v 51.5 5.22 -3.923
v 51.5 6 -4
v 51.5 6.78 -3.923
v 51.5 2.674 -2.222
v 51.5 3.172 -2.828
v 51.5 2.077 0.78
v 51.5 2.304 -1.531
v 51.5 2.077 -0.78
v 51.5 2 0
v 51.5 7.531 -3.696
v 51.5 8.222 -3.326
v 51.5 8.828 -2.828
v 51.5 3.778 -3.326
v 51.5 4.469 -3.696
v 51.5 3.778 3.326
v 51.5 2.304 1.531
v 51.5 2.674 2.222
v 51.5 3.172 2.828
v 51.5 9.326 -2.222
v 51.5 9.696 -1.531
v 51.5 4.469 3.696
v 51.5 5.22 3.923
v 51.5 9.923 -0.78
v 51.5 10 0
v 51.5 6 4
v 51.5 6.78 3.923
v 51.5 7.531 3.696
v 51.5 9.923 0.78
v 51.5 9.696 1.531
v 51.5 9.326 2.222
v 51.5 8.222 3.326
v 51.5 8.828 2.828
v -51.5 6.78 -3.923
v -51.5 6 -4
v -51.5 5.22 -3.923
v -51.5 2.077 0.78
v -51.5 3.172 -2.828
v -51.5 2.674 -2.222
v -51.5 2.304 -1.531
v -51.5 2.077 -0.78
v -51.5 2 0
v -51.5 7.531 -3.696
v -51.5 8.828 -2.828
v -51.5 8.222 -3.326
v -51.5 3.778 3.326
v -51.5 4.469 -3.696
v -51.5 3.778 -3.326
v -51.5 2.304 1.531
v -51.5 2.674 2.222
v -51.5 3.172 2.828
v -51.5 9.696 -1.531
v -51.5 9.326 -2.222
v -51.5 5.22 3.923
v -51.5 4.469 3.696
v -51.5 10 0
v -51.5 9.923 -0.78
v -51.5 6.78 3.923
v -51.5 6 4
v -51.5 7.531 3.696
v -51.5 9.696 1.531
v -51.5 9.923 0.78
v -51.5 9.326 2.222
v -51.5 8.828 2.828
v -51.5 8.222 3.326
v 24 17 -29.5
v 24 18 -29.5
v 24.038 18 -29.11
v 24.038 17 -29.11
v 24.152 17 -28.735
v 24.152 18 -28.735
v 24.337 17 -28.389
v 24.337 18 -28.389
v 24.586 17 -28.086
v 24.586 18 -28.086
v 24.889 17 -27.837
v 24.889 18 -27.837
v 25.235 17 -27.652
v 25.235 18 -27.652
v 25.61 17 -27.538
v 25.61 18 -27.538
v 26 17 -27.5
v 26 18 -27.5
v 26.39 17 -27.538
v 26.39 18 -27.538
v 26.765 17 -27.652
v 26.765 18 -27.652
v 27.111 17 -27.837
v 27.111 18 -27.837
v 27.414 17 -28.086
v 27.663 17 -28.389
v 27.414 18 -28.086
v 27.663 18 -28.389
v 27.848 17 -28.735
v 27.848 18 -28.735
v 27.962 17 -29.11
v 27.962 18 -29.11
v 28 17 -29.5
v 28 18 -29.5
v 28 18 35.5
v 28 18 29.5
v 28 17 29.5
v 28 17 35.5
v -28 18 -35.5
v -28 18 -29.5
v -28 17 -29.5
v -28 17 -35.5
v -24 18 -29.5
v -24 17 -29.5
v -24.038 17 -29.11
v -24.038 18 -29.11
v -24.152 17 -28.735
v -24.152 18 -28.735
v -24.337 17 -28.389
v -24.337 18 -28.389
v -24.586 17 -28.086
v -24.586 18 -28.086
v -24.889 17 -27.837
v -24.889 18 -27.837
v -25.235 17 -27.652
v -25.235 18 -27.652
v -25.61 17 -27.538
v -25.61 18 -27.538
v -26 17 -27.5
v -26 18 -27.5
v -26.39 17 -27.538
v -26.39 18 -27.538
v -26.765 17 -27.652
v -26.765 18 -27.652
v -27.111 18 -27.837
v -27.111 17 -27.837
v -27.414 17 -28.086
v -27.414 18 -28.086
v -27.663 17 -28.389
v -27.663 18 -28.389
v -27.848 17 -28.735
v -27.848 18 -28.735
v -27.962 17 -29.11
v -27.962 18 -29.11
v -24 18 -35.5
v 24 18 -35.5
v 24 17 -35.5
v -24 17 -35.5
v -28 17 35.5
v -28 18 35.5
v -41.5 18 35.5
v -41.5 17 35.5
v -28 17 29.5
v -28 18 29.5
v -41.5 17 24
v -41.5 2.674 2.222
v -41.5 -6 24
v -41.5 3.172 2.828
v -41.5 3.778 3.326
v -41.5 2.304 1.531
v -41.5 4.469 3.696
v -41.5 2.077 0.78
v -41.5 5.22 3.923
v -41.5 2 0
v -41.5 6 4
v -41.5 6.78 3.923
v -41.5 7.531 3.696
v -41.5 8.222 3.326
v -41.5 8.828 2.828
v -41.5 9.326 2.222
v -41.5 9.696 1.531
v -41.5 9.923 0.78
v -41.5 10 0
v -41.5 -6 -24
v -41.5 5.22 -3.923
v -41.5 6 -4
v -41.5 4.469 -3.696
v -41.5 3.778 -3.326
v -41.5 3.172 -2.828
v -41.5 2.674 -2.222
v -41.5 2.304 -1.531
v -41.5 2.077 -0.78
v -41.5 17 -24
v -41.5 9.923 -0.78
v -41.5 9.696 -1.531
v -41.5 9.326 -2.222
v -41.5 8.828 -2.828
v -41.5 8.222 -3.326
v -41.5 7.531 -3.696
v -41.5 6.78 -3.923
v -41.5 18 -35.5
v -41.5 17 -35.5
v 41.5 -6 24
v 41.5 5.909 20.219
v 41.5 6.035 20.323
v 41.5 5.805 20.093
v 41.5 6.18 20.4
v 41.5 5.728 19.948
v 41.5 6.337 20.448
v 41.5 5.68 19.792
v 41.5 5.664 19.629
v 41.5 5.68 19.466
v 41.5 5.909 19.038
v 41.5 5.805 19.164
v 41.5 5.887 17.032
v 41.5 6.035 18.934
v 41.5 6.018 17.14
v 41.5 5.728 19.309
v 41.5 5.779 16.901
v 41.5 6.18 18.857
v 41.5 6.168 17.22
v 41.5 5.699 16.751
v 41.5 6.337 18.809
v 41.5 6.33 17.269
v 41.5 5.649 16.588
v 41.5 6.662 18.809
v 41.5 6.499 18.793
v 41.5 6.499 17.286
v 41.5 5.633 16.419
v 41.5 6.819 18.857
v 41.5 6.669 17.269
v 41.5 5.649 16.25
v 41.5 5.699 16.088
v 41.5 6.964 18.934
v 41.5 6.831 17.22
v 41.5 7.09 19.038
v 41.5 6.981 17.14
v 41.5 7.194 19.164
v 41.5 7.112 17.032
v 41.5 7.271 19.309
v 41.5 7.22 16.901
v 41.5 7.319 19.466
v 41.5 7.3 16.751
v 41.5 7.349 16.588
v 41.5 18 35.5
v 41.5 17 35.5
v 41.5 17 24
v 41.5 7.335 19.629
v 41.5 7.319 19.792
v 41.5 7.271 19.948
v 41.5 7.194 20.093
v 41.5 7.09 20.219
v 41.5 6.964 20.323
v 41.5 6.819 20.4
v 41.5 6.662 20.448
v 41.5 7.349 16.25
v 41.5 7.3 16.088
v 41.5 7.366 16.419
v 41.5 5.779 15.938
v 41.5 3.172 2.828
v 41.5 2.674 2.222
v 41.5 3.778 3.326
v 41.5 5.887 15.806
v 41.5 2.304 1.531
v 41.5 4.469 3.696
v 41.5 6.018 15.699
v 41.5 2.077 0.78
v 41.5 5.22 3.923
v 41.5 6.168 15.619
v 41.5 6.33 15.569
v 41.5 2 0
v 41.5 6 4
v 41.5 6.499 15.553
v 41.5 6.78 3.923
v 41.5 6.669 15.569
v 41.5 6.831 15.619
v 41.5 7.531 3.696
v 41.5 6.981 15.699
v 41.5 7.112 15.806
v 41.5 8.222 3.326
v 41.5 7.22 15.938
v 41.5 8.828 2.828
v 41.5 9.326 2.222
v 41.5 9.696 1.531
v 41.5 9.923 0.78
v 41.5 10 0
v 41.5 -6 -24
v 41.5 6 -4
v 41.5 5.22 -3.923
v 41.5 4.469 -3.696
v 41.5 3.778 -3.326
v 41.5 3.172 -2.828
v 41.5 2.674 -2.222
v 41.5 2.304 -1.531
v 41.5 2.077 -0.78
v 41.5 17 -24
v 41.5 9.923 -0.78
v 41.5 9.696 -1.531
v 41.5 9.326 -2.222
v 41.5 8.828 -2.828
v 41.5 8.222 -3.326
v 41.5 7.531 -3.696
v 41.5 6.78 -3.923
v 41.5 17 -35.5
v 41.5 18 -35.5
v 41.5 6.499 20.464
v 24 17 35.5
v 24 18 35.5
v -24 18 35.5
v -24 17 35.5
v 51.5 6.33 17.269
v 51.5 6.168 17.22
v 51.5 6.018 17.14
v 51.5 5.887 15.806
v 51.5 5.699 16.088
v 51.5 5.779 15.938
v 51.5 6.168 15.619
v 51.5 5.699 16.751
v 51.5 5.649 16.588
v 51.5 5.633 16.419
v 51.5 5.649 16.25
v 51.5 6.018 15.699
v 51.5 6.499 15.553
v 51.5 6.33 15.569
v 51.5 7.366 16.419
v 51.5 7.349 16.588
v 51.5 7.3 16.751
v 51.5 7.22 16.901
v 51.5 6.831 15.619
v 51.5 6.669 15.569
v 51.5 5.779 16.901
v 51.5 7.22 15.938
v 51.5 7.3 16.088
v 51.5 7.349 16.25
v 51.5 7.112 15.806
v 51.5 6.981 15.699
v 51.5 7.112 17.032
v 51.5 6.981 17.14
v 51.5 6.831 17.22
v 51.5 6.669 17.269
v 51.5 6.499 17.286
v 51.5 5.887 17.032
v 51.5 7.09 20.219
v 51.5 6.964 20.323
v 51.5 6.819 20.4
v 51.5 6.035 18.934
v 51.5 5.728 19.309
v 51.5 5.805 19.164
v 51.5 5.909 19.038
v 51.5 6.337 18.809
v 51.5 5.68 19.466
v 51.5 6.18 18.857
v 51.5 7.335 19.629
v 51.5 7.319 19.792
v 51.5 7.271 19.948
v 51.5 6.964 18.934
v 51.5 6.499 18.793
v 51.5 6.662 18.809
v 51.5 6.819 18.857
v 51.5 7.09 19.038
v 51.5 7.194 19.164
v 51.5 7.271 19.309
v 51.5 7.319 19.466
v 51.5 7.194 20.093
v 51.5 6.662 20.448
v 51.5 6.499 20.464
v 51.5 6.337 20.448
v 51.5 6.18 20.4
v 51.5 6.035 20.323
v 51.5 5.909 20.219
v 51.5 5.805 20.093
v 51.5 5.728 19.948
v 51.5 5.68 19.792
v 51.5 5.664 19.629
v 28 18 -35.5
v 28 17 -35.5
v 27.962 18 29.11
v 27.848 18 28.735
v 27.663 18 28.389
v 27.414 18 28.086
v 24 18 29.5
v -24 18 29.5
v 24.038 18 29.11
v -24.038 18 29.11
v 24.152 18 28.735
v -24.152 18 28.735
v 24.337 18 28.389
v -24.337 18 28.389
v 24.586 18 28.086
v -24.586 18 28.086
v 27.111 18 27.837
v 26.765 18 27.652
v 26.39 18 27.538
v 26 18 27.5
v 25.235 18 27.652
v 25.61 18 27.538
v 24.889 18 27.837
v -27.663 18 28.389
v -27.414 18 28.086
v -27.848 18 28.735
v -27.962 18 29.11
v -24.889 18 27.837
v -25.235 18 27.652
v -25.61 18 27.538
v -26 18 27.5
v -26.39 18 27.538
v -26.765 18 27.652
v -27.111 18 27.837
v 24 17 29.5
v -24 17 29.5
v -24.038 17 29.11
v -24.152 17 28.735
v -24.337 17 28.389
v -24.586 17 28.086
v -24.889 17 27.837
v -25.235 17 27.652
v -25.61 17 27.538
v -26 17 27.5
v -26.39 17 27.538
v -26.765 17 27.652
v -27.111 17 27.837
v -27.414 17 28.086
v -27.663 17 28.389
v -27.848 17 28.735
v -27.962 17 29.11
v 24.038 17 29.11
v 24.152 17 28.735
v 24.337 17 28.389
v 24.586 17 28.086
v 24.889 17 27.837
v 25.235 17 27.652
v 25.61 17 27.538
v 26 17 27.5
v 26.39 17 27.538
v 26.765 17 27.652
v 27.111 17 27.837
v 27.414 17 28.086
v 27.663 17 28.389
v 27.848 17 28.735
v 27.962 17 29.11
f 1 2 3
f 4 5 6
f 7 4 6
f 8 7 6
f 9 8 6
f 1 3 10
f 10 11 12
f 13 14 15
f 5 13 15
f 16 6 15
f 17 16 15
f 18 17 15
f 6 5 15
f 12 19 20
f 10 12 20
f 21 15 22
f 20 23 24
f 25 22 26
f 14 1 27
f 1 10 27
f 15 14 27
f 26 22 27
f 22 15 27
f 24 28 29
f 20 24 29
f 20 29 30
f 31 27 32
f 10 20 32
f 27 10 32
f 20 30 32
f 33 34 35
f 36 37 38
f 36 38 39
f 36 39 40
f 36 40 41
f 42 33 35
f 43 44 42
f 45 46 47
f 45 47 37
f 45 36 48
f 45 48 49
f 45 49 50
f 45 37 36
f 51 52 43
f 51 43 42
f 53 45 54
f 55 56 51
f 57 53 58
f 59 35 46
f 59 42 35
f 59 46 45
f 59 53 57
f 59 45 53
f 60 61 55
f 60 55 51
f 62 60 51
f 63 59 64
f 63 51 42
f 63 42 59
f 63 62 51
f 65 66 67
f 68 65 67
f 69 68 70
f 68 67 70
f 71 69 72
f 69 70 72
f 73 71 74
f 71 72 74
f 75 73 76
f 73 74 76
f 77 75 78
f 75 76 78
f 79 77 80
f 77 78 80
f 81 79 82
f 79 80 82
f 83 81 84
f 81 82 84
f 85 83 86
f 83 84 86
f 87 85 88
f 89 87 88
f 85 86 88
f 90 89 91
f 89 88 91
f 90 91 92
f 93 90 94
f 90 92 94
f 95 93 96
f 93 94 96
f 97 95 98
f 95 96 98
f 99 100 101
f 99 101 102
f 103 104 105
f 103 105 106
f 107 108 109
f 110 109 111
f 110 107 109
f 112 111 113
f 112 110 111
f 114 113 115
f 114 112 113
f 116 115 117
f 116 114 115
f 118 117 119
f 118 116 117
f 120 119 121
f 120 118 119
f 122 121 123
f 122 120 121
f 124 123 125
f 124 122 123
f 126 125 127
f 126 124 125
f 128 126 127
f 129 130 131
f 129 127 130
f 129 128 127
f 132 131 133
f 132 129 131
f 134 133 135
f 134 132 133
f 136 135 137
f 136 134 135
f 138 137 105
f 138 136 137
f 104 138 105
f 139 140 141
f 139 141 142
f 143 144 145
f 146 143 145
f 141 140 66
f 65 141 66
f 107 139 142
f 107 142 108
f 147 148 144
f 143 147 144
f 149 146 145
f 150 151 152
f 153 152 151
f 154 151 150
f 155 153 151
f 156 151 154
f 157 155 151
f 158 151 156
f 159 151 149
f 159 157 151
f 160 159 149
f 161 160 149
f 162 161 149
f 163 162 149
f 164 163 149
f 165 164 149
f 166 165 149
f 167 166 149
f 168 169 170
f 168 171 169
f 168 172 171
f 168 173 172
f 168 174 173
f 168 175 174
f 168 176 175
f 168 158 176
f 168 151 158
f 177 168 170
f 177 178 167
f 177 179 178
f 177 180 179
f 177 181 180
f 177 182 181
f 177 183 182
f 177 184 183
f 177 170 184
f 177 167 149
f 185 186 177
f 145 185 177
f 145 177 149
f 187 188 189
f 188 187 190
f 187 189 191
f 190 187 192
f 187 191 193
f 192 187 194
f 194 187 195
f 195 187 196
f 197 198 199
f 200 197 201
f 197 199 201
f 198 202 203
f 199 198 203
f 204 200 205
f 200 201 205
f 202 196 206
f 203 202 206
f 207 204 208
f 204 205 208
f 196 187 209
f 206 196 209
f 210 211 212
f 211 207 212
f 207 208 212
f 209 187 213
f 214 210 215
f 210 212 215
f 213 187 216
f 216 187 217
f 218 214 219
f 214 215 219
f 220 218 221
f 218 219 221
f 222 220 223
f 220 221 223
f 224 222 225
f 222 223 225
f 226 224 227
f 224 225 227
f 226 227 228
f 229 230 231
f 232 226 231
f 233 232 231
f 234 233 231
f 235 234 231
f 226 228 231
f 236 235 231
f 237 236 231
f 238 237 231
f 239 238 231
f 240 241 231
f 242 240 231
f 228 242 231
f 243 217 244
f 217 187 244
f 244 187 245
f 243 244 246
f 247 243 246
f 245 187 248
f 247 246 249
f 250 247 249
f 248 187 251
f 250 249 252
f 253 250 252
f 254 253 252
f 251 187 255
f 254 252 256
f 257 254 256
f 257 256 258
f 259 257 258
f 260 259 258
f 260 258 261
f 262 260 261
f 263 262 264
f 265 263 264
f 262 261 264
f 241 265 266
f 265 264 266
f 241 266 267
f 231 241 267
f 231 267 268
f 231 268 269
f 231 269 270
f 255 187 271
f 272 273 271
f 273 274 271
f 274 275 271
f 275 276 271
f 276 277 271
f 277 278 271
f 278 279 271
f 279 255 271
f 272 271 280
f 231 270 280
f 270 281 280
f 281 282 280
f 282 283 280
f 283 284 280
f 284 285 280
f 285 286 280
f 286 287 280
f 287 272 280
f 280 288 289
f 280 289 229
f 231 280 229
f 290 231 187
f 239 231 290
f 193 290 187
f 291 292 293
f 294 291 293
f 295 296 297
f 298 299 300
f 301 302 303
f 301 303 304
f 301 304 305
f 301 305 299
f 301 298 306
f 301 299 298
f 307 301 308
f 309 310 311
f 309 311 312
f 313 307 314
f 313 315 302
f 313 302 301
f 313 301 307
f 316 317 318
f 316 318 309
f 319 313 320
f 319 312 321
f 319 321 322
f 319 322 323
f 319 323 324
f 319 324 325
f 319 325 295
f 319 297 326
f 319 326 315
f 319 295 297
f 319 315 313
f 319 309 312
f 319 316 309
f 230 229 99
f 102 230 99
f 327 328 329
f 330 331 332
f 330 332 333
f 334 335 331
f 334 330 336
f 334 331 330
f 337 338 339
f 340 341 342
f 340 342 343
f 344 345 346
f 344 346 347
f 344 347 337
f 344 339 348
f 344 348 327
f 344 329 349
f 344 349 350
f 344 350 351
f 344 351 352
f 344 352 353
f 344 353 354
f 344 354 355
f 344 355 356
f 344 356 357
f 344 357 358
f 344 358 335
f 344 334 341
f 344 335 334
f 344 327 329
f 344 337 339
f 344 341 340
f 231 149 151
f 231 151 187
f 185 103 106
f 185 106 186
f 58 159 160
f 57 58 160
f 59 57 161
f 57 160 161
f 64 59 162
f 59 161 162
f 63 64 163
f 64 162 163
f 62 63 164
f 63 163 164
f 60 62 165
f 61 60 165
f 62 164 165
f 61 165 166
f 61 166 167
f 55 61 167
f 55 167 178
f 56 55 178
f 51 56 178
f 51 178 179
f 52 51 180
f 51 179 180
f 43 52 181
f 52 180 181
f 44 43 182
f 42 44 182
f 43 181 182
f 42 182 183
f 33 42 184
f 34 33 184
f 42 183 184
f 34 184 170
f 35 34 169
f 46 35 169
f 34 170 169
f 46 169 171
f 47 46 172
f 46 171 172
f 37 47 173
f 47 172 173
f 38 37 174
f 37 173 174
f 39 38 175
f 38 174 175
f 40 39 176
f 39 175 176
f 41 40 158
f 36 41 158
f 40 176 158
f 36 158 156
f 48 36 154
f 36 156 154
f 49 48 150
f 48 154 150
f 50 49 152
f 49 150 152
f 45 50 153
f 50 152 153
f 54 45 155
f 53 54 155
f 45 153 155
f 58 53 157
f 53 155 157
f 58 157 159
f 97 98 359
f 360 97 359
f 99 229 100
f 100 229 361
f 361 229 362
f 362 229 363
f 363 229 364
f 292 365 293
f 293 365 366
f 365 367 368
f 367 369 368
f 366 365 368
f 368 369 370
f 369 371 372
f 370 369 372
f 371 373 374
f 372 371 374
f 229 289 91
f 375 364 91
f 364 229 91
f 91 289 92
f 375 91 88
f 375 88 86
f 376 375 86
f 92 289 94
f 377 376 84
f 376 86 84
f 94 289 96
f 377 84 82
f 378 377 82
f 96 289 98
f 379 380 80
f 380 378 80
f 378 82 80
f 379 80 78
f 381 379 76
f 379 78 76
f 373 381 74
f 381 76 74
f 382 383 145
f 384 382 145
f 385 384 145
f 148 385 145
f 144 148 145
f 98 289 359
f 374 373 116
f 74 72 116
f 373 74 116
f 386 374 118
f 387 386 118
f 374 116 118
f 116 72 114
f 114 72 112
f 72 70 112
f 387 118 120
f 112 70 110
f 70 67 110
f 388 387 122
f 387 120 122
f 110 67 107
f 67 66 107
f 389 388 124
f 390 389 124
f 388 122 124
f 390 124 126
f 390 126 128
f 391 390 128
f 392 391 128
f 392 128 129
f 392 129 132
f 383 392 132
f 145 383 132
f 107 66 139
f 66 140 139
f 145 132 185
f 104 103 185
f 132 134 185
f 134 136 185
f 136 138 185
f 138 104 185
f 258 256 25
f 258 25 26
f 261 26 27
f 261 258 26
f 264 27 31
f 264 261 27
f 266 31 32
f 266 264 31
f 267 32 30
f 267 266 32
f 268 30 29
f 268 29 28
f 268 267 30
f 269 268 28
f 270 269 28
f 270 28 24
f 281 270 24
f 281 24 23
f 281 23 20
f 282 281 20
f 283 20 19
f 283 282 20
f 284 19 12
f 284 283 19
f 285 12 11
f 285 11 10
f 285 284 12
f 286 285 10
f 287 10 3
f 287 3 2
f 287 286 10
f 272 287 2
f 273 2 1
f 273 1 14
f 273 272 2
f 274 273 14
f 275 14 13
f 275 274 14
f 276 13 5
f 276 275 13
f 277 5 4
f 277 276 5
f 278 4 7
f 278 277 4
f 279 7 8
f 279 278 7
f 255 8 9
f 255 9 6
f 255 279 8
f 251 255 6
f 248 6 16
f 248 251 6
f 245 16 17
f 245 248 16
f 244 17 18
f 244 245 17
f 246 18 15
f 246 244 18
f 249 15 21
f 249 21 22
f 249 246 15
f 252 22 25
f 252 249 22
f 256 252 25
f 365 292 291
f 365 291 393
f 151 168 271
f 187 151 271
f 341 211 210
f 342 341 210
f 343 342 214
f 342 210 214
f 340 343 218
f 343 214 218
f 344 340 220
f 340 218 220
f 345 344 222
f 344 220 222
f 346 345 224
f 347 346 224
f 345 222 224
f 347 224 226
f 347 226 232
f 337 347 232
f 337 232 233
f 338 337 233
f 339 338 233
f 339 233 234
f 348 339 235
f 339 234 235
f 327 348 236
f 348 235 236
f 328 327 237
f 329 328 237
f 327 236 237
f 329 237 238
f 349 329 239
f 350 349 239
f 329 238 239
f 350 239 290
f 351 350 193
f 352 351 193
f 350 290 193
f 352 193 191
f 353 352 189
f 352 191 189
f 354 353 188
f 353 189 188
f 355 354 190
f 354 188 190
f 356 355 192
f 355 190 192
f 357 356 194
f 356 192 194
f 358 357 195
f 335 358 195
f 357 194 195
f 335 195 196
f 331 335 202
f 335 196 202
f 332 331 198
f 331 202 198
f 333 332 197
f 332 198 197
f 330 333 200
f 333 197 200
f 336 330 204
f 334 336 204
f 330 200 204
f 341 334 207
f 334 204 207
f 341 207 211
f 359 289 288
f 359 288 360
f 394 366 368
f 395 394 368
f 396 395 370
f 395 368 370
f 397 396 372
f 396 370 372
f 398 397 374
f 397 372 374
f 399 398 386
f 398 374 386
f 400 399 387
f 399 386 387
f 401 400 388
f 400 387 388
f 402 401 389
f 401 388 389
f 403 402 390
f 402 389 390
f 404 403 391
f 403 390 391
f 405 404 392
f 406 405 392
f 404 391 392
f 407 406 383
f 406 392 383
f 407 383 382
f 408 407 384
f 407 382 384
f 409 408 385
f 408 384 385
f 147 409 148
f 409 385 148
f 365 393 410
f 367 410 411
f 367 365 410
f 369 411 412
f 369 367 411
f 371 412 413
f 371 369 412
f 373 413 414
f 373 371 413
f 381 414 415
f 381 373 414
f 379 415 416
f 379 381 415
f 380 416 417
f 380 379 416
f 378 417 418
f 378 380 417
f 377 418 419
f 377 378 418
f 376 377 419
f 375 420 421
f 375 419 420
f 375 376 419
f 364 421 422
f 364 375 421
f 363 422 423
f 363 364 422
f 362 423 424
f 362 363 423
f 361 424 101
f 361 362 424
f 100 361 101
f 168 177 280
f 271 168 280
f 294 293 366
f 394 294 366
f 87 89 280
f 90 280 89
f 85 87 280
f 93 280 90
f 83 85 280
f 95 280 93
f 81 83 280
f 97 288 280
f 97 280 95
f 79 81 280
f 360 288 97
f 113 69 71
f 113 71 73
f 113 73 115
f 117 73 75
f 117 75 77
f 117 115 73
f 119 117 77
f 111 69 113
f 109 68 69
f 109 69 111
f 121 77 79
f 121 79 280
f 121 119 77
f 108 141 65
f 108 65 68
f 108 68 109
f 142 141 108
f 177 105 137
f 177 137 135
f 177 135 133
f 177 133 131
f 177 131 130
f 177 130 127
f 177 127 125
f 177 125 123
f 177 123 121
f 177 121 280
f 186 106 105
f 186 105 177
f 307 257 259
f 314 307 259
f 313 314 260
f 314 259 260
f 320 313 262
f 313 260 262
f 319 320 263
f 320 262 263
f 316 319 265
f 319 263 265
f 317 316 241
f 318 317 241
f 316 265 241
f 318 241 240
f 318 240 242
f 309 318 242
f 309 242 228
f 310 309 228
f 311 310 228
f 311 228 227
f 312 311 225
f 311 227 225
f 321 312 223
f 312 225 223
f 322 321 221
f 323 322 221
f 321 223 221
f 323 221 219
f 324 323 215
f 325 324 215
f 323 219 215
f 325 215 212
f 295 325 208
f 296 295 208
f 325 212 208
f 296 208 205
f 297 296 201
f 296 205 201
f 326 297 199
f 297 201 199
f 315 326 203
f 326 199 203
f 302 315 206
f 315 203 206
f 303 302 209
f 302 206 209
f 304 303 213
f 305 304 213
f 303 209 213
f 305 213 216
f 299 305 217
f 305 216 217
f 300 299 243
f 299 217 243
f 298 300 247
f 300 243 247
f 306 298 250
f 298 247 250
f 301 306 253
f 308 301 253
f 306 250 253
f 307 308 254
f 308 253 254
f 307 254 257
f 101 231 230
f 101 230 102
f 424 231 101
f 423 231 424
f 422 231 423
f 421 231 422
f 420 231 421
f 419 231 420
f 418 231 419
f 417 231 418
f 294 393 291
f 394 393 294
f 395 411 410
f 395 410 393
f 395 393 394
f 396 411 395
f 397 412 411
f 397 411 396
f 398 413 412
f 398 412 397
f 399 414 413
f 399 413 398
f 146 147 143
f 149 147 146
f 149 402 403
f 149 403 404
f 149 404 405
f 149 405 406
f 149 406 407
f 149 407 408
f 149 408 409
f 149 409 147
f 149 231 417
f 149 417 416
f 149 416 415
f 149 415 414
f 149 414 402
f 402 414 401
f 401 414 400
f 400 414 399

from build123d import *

# Parameters (mm, degrees)
SKETCH_1_W            = 83
SKETCH_1_H            = 48
EXTRUDE_1_DEPTH       = 24
SKETCH_21_W           = 83
SKETCH_21_H           = 1
EXTRUDE_2_DEPTH       = 35.5
CUT_EXTRUDE_20_DEPTH  = 60.653164208
MIRROR_2_COPY_1_DEPTH = 60.653164208
MIRROR_2_COPY_2_DEPTH = 60.653164208
SKETCH_27_R           = 4
EXTRUDE_4_DEPTH       = 10
SKETCH_28_R           = 0.835314329
SKETCH_28_R_2         = 0.866649433
EXTRUDE_5_DEPTH       = 10


with BuildPart() as part:
    # 草圖1 → 填料-伸長1 (new body)
    with BuildSketch(Plane(origin=(0, 18, 0), x_dir=(1, 0, 0), z_dir=(0, 1, 0))):
        Rectangle(SKETCH_1_W, SKETCH_1_H)
    extrude(amount=-EXTRUDE_1_DEPTH)

    # 草圖21 → 填料-伸長2 (add, symmetric)
    with BuildSketch(Plane(origin=(0, 0, 0), x_dir=(-1, 0, 0), z_dir=(0, 0, -1))):
        with Locations((0, 17.5)):
            Rectangle(SKETCH_21_W, SKETCH_21_H)
    extrude(amount=EXTRUDE_2_DEPTH, both=True)

    # 草圖22 → 除料-伸長20 (cut, through all)
    with BuildSketch(Plane(origin=(0, 18, 0), x_dir=(-1, 0, 0), z_dir=(0, 1, 0))):
        with BuildLine():
            Line((-28, -29.5), (-28, -35.5))
            Line((-28, -35.5), (-24, -35.5))
            Line((-24, -35.5), (-24, -29.5))
            ThreePointArc((-24, -29.5), (-26, -27.5), (-28, -29.5))
        make_face()
    cut_extrude_20 = extrude(amount=-CUT_EXTRUDE_20_DEPTH, mode=Mode.SUBTRACT)

    # 鏡射1: 除料-伸長20 across plane
    add(cut_extrude_20.mirror(Plane(origin=(0, 0, 0), x_dir=(0, 0, 1), z_dir=(1, 0, 0))), mode=Mode.SUBTRACT)

    # 鏡射2 copy 1 sketch → 鏡射2 copy 1 (cut, through all)
    with BuildSketch(Plane(origin=(0, 18, 0), x_dir=(1, 0, 0), z_dir=(0, 1, 0))):
        with BuildLine():
            Line((-28, -29.5), (-28, -35.5))
            Line((-28, -35.5), (-24, -35.5))
            Line((-24, -35.5), (-24, -29.5))
            ThreePointArc((-24, -29.5), (-26, -27.5), (-28, -29.5))
        make_face()
    extrude(amount=-MIRROR_2_COPY_1_DEPTH, mode=Mode.SUBTRACT)

    # 鏡射2 copy 2 sketch → 鏡射2 copy 2 (cut, through all)
    with BuildSketch(Plane(origin=(0, 18, 0), x_dir=(-1, 0, 0), z_dir=(0, 1, 0))):
        with BuildLine():
            Line((-28, 29.5), (-28, 35.5))
            Line((-28, 35.5), (-24, 35.5))
            Line((-24, 35.5), (-24, 29.5))
            ThreePointArc((-24, 29.5), (-26, 27.5), (-28, 29.5))
        make_face()
    extrude(amount=-MIRROR_2_COPY_2_DEPTH, mode=Mode.SUBTRACT)

    # 草圖27 → 填料-伸長4 (add)
    with BuildSketch(Plane.ZY.offset(41.5)):
        with Locations((0, 6)):
            Circle(SKETCH_27_R)
    extrude_4 = extrude(amount=EXTRUDE_4_DEPTH)

    # 鏡射3: 填料-伸長4 across plane
    add(extrude_4.mirror(Plane(origin=(0, 0, 0), x_dir=(0, 0, 1), z_dir=(1, 0, 0))))

    # 草圖28 → 填料-伸長5 (add)
    with BuildSketch(Plane(origin=(41.5, 0, 0), x_dir=(0, 0, -1), z_dir=(1, 0, 0))):
        with Locations((-19.628552742, 6.499481813)):
            Circle(SKETCH_28_R)
        with Locations((-16.419283225, 6.499481813)):
            Circle(SKETCH_28_R_2)
    extrude(amount=EXTRUDE_5_DEPTH)


solid = part.part
